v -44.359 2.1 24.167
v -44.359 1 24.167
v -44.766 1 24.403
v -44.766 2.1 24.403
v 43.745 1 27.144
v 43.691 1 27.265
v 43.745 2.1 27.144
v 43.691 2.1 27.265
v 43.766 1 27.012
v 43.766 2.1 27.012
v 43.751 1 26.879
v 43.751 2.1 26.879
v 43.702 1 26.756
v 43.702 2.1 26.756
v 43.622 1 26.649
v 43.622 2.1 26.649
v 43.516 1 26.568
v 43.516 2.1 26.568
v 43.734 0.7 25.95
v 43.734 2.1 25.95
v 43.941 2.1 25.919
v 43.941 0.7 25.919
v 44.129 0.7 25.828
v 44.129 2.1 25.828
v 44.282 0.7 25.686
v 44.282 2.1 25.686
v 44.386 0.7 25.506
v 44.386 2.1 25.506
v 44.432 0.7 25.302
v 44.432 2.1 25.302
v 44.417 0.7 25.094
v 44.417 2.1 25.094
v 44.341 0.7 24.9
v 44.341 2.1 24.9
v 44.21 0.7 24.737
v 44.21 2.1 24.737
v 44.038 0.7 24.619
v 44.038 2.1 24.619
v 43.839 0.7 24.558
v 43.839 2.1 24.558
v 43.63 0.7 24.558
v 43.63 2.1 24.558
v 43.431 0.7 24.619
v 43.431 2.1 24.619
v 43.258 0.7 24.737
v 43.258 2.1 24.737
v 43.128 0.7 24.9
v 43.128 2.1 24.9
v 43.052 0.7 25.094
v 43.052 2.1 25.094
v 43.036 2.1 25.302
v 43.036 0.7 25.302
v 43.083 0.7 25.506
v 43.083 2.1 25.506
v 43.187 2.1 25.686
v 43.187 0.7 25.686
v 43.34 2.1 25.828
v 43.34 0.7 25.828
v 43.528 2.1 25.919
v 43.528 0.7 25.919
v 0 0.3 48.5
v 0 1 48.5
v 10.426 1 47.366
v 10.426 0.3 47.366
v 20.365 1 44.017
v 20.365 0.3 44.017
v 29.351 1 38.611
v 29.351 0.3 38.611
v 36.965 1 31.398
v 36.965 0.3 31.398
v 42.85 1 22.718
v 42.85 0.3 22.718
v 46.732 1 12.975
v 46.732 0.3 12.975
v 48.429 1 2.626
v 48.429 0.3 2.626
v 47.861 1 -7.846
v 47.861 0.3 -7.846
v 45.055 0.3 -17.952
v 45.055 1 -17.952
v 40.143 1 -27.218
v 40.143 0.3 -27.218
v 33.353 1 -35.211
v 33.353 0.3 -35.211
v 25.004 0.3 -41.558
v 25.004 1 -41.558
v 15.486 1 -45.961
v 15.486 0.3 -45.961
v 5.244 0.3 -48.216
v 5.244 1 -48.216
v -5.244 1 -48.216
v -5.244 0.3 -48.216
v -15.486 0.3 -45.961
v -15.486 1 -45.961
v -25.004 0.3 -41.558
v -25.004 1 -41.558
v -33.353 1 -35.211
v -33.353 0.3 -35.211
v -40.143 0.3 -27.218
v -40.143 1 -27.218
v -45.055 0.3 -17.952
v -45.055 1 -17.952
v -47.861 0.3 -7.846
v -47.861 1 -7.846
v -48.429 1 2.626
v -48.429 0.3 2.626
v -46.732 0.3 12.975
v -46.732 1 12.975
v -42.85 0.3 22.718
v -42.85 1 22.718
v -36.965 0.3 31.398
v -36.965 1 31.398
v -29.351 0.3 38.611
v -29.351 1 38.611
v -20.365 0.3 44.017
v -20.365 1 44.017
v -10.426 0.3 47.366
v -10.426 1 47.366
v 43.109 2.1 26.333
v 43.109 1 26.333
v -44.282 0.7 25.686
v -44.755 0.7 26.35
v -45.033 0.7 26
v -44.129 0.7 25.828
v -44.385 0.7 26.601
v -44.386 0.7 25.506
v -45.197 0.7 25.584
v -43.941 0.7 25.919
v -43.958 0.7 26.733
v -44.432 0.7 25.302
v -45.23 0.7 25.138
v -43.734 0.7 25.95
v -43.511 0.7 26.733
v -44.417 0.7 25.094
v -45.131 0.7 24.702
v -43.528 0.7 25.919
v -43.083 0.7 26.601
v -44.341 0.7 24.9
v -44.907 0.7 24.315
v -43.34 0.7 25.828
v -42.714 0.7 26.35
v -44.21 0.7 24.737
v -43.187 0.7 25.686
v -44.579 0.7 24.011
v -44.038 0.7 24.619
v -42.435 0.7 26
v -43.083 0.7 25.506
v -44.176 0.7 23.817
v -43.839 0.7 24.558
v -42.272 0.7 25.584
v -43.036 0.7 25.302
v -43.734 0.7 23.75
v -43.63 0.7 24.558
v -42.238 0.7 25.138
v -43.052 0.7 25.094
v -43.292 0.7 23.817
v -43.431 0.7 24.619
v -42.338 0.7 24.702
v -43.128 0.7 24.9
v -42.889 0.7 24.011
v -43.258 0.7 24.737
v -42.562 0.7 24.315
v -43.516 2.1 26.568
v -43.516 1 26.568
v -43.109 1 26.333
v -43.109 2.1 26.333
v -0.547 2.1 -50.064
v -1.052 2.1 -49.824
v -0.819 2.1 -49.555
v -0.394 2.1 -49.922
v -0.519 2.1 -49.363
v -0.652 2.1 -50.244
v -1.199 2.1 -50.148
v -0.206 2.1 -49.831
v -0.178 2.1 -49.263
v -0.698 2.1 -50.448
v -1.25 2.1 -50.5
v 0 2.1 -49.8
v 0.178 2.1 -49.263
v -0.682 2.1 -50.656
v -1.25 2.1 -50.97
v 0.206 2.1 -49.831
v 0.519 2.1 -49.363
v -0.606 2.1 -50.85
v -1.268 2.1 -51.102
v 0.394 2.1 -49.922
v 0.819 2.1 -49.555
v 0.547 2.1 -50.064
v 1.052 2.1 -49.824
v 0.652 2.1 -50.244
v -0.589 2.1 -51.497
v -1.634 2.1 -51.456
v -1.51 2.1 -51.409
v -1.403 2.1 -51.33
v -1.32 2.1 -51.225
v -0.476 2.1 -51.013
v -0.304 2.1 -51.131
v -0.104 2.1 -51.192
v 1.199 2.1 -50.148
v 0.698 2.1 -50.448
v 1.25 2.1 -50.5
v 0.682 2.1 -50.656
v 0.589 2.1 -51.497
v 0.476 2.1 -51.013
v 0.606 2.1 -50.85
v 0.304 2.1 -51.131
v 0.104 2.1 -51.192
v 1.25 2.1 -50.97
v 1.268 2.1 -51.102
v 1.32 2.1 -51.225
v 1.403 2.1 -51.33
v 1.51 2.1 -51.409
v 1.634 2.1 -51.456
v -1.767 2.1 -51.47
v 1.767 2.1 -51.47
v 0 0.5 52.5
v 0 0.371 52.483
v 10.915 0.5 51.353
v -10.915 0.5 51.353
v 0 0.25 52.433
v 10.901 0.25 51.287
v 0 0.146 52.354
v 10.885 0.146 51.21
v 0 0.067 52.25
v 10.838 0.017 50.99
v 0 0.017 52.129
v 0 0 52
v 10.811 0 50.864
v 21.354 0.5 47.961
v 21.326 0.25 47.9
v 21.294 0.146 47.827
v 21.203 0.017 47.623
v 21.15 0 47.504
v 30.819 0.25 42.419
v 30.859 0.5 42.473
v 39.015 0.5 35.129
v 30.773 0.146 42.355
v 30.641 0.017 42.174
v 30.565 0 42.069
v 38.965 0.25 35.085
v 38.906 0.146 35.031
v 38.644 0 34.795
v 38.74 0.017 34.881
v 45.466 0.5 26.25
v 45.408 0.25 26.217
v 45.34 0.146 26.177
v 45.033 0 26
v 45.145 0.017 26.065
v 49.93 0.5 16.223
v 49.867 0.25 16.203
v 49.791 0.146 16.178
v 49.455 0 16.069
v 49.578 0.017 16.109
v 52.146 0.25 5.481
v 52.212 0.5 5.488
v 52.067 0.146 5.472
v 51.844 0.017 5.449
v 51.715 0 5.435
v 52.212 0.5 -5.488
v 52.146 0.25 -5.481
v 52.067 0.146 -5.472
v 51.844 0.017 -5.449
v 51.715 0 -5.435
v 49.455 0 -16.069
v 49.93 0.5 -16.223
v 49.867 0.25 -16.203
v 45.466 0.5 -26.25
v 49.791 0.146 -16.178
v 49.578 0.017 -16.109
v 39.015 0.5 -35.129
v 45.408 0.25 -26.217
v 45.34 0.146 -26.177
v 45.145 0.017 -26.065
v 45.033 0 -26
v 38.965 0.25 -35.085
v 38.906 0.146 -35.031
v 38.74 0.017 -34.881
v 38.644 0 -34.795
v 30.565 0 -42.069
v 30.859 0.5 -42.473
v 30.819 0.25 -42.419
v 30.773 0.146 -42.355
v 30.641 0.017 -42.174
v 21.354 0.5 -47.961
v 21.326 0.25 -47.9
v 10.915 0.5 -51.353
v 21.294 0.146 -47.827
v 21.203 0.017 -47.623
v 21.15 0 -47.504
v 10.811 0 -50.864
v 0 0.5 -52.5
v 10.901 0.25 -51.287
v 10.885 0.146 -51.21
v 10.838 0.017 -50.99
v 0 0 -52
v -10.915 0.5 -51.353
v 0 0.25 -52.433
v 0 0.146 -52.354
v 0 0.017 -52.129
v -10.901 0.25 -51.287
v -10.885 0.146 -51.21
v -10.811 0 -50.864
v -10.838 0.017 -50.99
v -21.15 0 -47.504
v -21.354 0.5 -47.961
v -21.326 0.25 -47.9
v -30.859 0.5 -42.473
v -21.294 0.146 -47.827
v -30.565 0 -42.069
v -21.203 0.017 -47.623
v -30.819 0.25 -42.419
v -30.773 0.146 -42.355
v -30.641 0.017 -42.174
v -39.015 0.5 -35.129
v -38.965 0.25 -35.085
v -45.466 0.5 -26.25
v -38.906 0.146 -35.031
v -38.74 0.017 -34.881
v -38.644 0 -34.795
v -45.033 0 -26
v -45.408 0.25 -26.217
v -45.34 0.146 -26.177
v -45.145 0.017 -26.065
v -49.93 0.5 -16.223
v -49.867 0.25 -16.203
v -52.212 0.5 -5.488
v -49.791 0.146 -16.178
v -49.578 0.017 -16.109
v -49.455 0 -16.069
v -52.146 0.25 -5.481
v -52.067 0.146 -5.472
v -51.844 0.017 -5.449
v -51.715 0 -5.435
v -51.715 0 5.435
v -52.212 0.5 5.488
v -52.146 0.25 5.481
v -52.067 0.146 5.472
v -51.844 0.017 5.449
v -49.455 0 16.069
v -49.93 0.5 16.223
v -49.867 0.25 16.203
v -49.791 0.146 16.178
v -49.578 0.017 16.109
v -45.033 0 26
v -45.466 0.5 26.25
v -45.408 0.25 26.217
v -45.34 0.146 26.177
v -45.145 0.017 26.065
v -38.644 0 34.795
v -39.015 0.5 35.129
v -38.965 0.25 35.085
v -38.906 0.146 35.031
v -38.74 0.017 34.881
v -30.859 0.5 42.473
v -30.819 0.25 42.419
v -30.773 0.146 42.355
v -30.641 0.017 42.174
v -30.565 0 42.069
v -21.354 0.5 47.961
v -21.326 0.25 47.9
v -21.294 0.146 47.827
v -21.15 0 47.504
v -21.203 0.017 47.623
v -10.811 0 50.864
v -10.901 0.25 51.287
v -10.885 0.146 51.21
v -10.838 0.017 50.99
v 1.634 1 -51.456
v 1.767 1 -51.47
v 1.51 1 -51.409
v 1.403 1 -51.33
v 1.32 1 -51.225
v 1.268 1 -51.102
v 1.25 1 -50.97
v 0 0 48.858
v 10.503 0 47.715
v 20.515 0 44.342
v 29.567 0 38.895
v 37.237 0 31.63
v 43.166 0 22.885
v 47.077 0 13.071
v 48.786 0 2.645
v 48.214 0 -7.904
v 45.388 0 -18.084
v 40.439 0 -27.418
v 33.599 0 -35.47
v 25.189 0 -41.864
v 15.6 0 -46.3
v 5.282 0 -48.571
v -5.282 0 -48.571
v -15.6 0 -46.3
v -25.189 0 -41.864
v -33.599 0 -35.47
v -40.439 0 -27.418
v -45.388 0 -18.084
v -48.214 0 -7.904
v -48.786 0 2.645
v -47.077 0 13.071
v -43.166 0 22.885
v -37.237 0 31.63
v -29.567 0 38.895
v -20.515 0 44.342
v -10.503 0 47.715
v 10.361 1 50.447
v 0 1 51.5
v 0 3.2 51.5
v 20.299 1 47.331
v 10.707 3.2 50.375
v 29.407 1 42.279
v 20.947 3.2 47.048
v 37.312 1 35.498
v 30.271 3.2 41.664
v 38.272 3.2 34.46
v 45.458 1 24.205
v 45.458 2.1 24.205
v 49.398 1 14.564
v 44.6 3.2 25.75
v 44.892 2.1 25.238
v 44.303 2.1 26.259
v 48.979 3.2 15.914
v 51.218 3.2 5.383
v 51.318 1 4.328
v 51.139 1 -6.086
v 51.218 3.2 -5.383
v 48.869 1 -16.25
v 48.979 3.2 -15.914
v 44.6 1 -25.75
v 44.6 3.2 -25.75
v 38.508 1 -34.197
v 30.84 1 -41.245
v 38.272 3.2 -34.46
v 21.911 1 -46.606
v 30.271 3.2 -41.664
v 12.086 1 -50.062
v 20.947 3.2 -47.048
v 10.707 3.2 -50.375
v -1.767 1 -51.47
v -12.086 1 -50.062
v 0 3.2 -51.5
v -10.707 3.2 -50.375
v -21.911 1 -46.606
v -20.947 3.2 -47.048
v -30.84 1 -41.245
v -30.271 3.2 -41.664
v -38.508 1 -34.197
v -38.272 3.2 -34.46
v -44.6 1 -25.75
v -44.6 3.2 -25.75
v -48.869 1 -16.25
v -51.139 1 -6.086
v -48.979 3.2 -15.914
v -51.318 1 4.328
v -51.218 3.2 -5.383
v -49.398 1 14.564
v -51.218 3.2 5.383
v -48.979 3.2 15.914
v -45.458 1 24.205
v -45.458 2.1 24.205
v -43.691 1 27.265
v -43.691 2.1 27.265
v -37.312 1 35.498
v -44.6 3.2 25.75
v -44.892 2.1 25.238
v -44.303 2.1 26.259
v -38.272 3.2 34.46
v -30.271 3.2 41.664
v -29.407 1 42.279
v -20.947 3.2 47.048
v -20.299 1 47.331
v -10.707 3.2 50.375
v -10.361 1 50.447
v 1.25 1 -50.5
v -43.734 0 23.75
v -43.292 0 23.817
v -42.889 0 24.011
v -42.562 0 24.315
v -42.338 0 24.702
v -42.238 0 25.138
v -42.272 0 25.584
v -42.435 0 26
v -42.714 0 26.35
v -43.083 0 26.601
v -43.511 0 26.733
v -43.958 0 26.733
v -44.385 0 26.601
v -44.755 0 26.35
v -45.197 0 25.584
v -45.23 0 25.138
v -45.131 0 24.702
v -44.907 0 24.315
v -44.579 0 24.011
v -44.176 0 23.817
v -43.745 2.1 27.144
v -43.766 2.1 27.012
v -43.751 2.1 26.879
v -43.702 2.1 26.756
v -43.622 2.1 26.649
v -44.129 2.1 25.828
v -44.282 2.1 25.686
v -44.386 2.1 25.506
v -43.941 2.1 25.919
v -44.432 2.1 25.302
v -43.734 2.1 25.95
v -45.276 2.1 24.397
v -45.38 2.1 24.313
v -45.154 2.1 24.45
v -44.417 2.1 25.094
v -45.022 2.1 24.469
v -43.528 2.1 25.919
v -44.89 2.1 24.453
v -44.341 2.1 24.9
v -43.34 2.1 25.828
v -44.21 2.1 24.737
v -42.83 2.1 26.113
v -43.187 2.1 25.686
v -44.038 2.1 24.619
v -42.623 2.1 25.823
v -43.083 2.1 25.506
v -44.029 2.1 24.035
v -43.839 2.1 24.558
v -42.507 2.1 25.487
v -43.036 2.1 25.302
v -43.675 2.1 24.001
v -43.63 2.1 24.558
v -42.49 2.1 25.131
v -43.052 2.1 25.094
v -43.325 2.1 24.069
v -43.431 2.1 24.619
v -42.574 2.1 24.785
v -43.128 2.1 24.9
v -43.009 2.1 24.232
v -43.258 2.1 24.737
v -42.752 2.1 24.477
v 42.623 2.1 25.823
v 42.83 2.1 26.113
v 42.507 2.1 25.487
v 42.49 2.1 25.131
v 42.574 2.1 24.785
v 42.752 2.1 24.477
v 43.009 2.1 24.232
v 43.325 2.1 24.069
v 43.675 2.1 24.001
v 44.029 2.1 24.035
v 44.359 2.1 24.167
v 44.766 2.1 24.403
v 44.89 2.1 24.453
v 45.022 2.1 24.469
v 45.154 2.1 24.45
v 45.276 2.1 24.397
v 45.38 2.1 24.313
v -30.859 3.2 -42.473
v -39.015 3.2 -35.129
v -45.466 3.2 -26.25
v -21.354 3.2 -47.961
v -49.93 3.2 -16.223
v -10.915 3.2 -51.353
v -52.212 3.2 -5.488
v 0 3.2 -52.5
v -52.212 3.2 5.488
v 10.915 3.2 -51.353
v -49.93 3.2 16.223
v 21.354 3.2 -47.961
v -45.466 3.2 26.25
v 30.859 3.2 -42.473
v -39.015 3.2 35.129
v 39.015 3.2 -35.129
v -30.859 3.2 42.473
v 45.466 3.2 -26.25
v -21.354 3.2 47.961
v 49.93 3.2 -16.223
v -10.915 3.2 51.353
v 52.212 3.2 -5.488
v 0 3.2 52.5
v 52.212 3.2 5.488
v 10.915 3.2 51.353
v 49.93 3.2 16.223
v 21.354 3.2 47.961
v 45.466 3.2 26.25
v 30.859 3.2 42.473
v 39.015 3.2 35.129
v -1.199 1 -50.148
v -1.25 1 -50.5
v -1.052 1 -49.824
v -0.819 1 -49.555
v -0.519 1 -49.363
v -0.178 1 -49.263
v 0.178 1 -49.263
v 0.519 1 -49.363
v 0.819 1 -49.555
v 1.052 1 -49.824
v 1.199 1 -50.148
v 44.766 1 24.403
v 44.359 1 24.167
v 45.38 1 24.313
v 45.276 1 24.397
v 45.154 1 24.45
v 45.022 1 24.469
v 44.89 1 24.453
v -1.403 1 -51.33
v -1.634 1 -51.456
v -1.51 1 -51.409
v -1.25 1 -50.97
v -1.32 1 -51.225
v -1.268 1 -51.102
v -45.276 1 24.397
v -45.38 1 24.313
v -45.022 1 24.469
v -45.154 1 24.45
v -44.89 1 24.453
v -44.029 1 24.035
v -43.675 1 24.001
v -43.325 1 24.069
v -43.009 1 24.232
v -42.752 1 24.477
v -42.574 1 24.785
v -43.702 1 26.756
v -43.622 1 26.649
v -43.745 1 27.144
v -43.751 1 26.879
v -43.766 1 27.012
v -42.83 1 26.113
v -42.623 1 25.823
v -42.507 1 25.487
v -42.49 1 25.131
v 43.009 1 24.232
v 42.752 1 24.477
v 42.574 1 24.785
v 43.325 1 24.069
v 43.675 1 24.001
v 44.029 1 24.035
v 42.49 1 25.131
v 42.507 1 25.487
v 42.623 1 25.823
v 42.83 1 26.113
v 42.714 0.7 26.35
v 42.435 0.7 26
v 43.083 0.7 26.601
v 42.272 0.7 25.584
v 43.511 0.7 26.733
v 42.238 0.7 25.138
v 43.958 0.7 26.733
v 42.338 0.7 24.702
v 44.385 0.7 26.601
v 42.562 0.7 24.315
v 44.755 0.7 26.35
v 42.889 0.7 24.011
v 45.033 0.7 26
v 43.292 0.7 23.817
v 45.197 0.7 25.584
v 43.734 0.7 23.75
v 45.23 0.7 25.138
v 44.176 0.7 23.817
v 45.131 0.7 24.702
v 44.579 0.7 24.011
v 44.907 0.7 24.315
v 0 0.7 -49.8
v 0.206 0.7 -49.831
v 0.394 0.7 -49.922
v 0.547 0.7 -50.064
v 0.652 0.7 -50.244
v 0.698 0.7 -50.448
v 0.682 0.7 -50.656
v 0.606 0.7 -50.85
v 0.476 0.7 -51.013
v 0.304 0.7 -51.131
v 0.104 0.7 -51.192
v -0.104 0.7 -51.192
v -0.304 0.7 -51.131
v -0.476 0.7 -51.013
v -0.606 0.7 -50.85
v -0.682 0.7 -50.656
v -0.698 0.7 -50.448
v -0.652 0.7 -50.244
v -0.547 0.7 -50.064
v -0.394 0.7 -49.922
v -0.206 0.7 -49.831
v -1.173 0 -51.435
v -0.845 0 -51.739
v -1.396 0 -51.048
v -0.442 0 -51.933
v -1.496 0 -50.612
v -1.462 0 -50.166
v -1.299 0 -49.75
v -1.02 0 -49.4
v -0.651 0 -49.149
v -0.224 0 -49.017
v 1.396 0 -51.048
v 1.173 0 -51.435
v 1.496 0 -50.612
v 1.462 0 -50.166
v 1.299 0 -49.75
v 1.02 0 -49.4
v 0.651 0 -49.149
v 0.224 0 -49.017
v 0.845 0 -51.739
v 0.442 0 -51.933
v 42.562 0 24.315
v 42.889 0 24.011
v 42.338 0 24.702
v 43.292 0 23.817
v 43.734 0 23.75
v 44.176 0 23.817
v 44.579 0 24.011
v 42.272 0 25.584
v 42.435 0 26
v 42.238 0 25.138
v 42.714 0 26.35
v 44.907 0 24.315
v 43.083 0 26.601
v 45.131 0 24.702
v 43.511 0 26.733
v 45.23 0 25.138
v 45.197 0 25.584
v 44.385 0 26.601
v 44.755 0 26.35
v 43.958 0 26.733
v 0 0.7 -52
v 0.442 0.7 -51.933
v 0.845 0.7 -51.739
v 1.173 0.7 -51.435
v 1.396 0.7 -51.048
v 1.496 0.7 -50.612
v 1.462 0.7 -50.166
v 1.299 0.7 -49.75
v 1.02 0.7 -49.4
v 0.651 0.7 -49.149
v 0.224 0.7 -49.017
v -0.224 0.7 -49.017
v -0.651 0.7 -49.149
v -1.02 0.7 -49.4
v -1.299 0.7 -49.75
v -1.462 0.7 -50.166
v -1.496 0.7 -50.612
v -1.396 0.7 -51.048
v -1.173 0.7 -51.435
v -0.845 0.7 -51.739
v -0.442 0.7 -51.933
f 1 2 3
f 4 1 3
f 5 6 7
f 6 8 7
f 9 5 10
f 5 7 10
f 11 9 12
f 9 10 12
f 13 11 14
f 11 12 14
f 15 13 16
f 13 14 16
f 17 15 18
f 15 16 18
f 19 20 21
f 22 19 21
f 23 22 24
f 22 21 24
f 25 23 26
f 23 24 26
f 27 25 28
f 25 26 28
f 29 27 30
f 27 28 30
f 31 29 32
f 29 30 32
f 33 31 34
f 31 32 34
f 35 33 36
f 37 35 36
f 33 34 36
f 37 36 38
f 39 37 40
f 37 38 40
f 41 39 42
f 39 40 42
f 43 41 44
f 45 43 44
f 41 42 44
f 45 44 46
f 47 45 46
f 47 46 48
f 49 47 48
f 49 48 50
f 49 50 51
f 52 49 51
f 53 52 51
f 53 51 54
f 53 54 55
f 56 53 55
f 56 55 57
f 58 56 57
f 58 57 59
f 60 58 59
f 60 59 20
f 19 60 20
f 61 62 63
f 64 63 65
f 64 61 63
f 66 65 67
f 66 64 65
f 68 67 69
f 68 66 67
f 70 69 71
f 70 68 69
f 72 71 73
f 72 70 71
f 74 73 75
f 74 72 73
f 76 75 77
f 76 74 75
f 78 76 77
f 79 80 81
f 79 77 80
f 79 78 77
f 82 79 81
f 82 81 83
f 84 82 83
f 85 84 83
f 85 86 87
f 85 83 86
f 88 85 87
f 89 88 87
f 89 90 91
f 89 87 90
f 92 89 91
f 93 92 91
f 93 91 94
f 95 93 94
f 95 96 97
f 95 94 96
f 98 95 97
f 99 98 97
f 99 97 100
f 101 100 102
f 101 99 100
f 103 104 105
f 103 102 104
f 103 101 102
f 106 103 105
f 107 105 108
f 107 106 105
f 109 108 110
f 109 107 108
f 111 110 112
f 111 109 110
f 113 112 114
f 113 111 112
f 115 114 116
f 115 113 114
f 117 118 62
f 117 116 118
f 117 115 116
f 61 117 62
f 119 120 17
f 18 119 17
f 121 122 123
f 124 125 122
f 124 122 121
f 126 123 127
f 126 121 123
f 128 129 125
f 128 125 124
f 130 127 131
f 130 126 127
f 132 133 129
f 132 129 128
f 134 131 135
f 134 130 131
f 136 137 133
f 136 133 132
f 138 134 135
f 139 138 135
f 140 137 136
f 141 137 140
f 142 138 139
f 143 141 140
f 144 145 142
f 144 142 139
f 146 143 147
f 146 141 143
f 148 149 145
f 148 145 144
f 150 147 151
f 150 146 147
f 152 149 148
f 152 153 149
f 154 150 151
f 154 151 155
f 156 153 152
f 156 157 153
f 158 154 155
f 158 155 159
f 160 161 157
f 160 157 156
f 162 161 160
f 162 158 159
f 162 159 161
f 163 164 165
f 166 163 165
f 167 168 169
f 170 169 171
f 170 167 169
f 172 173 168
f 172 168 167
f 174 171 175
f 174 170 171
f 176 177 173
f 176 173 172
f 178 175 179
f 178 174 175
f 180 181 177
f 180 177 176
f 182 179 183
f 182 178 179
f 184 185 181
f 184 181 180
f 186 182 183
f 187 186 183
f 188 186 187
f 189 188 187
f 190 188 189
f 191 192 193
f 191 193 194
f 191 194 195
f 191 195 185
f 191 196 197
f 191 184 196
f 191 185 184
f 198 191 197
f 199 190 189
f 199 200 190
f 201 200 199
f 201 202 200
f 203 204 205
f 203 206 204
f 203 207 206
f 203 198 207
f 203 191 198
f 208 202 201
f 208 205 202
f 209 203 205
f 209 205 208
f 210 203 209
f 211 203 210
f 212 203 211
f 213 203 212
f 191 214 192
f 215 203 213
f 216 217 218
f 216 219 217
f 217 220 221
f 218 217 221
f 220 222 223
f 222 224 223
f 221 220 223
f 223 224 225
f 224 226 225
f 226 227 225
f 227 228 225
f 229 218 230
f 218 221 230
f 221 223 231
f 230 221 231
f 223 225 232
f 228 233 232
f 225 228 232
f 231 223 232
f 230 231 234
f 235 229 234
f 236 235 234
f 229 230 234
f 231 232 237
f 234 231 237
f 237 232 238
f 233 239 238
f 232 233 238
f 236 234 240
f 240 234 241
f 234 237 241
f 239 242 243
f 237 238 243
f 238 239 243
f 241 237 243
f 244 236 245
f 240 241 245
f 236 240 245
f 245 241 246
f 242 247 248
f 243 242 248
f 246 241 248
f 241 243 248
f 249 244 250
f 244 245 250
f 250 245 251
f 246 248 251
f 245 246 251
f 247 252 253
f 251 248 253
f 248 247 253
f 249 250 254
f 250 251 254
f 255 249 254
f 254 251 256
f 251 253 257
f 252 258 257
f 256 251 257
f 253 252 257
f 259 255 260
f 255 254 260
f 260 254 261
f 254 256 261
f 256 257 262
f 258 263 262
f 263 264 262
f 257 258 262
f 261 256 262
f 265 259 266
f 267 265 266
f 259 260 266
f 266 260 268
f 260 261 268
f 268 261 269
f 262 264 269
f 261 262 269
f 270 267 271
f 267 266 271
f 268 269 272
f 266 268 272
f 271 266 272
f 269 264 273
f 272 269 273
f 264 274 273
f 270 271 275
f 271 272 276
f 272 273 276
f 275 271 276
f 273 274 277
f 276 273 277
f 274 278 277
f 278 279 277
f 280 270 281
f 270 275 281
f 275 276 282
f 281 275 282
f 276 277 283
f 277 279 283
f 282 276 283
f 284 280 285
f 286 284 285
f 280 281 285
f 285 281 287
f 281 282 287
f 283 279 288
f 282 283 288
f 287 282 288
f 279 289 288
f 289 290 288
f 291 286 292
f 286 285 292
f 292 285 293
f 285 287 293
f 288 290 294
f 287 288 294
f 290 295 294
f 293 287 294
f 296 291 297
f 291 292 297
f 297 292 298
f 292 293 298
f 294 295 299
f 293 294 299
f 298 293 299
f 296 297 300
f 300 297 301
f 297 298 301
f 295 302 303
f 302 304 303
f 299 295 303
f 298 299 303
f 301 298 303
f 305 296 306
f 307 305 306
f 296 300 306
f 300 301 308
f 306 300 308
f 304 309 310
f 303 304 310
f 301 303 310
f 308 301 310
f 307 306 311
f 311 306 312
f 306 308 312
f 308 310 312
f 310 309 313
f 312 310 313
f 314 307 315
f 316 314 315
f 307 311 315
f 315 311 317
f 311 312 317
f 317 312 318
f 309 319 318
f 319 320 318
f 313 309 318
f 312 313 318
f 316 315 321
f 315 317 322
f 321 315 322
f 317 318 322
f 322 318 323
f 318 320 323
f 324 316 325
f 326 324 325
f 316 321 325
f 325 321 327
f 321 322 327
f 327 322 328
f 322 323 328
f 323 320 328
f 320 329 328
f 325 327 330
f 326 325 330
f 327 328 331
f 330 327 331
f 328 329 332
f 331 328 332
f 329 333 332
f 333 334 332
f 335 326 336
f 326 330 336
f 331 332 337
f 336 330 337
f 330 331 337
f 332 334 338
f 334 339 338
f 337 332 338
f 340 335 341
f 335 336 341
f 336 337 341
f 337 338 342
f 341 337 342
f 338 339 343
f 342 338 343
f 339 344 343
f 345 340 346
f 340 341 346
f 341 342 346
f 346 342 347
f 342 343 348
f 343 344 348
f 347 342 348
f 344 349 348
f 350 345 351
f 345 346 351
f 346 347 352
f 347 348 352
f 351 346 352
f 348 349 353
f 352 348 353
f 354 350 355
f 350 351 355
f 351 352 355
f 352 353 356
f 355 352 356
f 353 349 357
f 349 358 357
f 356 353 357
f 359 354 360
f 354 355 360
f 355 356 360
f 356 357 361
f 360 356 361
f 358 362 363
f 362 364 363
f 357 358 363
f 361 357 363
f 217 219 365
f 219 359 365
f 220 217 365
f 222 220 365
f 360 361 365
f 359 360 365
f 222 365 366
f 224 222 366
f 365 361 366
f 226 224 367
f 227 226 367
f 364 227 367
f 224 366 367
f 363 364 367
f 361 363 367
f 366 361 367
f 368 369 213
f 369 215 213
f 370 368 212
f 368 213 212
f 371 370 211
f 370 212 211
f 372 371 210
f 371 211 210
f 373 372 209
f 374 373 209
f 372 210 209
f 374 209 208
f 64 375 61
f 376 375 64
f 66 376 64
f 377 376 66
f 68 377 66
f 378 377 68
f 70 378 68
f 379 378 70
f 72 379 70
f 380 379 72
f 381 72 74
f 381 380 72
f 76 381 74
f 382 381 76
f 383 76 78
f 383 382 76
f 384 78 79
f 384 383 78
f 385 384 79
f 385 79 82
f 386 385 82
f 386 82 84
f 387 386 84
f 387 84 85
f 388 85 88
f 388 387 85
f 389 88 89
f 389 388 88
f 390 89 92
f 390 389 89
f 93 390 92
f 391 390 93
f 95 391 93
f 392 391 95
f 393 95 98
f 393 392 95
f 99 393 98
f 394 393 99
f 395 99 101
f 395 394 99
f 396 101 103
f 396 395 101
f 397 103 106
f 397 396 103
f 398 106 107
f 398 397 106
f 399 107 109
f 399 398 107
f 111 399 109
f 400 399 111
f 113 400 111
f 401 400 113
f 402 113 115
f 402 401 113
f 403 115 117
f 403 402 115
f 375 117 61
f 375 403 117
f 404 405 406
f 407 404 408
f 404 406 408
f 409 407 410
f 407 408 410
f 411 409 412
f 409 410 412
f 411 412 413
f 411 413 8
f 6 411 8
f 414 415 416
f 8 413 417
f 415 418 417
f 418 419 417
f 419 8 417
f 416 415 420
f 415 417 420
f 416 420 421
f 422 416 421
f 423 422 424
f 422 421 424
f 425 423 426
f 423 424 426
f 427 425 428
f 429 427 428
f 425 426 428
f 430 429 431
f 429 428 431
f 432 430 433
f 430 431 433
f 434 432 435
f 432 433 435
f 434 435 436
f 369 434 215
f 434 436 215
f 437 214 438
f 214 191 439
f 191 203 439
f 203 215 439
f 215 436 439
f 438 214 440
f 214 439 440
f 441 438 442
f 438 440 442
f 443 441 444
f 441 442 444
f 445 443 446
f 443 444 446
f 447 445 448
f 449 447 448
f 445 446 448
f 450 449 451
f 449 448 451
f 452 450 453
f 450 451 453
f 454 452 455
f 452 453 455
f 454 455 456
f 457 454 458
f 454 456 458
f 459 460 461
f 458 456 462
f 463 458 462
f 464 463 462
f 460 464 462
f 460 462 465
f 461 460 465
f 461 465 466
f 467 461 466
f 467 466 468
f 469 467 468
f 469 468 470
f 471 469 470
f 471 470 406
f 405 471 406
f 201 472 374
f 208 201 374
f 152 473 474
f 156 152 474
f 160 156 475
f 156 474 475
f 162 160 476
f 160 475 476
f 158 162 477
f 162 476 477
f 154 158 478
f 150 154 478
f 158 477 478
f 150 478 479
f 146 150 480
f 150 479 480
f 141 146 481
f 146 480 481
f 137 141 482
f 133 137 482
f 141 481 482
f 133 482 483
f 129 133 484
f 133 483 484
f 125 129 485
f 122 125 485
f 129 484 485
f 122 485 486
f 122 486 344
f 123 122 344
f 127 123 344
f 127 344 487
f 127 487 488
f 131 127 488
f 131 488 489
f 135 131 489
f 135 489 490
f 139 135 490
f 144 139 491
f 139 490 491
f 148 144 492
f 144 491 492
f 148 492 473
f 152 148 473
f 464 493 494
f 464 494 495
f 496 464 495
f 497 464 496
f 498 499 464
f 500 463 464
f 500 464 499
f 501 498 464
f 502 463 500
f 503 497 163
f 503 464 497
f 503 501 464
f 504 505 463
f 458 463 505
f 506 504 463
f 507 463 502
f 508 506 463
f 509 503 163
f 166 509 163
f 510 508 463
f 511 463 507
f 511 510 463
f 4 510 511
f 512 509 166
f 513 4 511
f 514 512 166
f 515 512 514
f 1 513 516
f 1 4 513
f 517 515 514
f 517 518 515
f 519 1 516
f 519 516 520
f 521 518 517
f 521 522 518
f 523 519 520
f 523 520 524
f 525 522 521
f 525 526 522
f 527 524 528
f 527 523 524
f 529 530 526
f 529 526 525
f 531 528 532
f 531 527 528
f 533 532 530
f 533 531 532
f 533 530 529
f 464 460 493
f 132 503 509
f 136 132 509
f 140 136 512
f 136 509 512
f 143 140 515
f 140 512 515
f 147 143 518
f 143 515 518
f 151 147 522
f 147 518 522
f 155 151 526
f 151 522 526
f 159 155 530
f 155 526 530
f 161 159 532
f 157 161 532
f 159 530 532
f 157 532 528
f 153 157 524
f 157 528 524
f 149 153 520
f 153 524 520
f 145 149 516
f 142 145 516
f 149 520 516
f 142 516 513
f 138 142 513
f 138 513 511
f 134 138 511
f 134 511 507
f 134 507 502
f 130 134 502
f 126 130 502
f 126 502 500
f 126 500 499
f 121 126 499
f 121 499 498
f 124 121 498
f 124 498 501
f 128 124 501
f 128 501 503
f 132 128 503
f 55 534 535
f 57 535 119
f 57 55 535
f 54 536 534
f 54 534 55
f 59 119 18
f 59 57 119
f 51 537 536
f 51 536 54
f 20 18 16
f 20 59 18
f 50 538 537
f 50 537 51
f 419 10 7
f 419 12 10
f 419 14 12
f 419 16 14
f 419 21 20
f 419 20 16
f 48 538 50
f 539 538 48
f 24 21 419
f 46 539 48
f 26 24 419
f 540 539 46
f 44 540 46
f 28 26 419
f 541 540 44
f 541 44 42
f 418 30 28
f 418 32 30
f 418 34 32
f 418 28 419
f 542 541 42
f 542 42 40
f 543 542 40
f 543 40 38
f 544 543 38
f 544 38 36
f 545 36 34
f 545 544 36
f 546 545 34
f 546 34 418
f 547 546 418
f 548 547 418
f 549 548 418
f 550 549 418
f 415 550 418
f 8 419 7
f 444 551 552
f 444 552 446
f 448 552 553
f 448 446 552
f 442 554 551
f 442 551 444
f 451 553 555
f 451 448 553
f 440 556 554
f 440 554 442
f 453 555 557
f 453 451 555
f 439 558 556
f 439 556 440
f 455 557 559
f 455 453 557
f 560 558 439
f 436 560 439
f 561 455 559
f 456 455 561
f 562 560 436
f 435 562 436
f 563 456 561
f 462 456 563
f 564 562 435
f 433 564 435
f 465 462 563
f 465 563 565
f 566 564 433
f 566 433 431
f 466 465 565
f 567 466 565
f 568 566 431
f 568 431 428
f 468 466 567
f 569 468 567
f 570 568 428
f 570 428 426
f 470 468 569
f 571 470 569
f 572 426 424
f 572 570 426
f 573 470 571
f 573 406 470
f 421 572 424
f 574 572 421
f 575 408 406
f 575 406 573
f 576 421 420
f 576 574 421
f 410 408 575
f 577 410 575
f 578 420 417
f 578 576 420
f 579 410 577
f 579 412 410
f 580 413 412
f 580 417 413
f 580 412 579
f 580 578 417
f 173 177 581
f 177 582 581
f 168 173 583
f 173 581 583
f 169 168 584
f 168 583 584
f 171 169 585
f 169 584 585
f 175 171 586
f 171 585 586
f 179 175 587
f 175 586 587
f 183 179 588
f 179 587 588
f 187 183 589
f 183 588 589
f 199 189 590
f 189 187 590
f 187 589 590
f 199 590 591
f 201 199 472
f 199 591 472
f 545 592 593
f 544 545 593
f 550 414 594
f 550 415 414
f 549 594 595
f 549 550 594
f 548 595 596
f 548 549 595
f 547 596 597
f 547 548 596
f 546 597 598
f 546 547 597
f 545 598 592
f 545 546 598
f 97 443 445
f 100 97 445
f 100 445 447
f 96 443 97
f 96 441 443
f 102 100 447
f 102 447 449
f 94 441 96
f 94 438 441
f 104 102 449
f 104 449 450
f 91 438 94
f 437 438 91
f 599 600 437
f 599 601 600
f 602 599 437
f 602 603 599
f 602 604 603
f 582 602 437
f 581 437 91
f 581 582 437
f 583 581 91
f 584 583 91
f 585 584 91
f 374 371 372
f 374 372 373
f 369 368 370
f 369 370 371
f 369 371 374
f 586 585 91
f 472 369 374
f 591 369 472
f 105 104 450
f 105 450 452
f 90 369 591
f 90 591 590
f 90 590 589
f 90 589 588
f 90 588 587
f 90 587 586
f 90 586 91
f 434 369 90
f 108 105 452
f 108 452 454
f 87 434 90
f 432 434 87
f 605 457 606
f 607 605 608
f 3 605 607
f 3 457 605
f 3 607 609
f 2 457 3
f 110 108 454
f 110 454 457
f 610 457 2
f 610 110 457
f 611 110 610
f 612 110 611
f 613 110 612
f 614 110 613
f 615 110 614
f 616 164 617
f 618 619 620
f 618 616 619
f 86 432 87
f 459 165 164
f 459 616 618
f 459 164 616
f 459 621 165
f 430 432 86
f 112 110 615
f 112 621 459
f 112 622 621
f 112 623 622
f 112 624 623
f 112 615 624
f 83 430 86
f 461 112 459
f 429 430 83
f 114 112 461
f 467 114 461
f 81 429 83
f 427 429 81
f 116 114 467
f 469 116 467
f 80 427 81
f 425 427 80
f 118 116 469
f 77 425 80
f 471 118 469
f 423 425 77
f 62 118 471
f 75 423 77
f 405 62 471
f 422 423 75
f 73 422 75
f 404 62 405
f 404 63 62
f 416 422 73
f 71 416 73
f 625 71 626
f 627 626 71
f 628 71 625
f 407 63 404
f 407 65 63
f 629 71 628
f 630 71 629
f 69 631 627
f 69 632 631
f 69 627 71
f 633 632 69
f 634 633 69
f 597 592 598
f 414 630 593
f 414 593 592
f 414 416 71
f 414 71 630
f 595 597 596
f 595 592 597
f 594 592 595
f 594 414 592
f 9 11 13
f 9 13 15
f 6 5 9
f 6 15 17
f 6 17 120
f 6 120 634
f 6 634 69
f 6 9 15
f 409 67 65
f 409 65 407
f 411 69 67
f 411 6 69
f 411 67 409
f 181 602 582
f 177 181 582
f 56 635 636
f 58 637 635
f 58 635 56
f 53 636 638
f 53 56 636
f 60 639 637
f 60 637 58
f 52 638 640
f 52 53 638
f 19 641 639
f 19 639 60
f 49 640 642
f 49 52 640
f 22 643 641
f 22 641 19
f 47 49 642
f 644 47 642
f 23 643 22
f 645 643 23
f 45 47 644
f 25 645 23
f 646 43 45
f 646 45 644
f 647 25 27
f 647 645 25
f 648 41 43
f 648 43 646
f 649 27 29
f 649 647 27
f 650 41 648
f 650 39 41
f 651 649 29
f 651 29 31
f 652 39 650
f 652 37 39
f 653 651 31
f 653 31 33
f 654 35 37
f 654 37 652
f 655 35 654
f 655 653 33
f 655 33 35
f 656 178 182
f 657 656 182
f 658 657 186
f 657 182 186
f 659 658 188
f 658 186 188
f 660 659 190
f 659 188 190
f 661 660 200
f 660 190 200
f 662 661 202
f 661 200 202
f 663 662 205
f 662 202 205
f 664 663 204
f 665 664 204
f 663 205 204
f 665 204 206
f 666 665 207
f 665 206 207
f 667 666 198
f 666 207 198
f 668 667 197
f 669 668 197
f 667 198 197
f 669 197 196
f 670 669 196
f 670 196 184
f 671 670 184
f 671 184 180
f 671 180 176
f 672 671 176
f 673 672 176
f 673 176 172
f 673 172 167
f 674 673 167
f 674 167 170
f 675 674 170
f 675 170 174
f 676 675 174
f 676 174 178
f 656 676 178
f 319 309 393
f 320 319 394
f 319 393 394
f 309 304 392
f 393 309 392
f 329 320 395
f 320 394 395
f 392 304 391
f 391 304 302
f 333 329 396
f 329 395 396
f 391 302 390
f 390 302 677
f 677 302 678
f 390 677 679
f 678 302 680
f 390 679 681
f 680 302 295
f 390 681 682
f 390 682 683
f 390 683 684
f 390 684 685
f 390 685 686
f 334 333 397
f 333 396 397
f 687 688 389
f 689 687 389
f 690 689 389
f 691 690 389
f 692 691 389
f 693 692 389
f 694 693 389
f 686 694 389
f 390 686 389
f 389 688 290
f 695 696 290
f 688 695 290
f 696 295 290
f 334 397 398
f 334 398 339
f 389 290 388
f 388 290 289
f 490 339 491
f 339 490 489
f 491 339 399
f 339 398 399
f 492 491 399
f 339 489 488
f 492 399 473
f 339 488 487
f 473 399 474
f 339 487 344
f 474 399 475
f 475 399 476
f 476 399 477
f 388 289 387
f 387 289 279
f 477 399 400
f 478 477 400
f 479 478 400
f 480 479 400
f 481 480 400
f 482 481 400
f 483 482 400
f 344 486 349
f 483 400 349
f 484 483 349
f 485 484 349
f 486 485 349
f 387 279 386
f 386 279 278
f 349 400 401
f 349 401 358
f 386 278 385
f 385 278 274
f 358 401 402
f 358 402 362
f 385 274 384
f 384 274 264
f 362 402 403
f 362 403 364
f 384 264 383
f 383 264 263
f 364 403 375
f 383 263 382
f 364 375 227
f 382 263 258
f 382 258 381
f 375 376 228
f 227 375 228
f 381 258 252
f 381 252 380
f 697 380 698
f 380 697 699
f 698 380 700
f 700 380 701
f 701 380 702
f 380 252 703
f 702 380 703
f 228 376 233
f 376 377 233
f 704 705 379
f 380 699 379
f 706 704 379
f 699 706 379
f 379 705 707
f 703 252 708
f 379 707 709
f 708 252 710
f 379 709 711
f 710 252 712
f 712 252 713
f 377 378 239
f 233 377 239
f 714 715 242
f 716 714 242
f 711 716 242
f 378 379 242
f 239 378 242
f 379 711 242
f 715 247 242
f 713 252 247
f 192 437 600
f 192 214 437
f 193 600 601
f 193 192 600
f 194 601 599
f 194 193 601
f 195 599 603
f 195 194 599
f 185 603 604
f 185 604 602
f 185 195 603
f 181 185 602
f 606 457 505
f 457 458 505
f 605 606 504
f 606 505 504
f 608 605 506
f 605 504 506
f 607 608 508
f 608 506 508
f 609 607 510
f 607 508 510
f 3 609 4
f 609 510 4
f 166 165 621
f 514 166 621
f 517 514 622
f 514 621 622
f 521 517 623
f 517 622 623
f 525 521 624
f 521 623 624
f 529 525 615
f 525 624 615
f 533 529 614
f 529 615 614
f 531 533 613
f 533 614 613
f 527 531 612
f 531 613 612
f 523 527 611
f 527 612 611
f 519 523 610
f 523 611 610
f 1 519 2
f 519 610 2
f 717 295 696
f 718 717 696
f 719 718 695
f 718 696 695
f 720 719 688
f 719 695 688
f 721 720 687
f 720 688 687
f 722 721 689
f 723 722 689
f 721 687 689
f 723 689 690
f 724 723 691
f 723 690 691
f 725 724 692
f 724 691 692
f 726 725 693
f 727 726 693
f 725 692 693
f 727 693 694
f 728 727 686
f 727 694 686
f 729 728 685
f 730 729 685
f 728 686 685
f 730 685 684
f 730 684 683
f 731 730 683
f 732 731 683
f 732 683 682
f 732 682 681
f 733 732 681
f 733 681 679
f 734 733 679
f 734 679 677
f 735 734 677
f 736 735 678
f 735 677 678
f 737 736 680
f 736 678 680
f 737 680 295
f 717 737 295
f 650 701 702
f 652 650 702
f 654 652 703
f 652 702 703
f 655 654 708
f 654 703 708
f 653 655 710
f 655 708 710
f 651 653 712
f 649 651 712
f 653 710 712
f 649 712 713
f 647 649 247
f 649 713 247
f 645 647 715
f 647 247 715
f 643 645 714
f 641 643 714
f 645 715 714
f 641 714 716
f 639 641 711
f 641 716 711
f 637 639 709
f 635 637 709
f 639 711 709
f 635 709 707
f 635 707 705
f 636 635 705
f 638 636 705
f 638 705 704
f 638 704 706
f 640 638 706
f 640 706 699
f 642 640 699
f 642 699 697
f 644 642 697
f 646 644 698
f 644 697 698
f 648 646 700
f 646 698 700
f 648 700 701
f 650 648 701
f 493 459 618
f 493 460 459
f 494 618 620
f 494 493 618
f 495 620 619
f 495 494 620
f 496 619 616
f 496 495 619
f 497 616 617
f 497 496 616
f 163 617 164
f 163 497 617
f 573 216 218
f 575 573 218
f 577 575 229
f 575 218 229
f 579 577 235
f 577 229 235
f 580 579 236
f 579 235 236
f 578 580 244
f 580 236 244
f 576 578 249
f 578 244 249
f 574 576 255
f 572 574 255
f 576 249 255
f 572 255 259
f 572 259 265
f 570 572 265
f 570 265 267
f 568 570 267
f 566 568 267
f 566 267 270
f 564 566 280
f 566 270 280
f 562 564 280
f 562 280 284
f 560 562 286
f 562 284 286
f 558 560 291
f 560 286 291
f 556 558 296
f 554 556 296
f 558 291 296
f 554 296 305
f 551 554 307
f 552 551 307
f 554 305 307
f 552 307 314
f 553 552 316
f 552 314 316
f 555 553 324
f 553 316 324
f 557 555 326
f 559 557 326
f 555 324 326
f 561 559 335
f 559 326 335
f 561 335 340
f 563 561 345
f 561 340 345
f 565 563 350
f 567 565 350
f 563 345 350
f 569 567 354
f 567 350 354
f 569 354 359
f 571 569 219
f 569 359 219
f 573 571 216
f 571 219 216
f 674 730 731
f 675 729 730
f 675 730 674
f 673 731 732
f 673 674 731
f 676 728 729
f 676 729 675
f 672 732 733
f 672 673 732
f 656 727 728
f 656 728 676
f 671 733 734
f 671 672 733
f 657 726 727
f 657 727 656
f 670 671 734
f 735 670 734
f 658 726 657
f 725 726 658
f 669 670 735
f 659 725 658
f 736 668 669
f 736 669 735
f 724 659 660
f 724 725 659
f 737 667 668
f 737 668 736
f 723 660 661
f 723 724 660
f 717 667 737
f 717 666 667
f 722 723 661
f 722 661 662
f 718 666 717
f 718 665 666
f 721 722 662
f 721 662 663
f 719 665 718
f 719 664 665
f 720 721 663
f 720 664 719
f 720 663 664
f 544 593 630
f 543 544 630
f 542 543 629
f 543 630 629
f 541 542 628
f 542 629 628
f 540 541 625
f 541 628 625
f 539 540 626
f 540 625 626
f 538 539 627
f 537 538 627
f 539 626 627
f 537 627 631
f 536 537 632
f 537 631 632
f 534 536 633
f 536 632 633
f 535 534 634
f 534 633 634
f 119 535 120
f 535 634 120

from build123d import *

# Parameters (mm, degrees)
SKETCH_1_R          = 52.5
SKETCH_1_R_2        = 48.5
EXTRUDE_1_DEPTH     = 3.2
SKETCH_2_R          = 51.5
CUT_EXTRUDE_1_DEPTH = 2.2
SKETCH_3_R          = 1.25
EXTRUDE_2_DEPTH     = 1.1
EXTRUDE_3_DEPTH     = 1.1
SKETCH_5_R          = 0.7
CUT_EXTRUDE_2_DEPTH = 75.315139776
SKETCH_6_R          = 1.5
CUT_EXTRUDE_3_DEPTH = 0.7
FILLET_1_R          = 0.5
CHAMFER_1_SIZE      = 0.3
CHAMFER_1_SIZE2     = 0.357526078


with BuildPart() as part:
    # 草图1 → 凸台-拉伸1 (new body)
    with BuildSketch(Plane(origin=(0, 0, 0), x_dir=(1, 0, 0), z_dir=(0, 1, 0))):
        with Locations(Location((0, 0, 0), (0, 0, 270))):
            Circle(SKETCH_1_R)
        with Locations(Location((0, 0, 0), (0, 0, 270))):
            Circle(SKETCH_1_R_2, mode=Mode.SUBTRACT)
    extrude(amount=EXTRUDE_1_DEPTH)

    # 草图2 → 切除-拉伸1 (cut)
    with BuildSketch(Plane(origin=(0, 3.2, 0), x_dir=(1, 0, 0), z_dir=(0, 1, 0))):
        with Locations(Location((0, 0, 0), (0, 0, 270))):
            Circle(SKETCH_2_R)
    extrude(amount=-CUT_EXTRUDE_1_DEPTH, mode=Mode.SUBTRACT)

    # 草图3 → 凸台-拉伸2 (add)
    with BuildSketch(Plane(origin=(0, 1, 0), x_dir=(1, 0, 0), z_dir=(0, 1, 0))):
        with Locations((-43.734282891, -25.25)):
            Circle(SKETCH_3_R)
        with Locations((43.734282891, -25.25)):
            Circle(SKETCH_3_R)
        with Locations((0, 50.5)):
            Circle(SKETCH_3_R)
    extrude(amount=EXTRUDE_2_DEPTH)

    # 草图4 → 凸台-拉伸3 (add)
    with BuildSketch(Plane(origin=(0, 1, 0), x_dir=(1, 0, 0), z_dir=(0, 1, 0))):
        with BuildLine():
            ThreePointArc((-44.974169566, -25.09131467), (-44.774871009, -24.557413277), (-44.359282891, -24.167468245))
            Line((-44.359282891, -24.167468245), (-45.225308295, -24.667468245))
            Line((-45.225308295, -24.667468245), (-44.600307976, -25.750000552))
            ThreePointArc((-44.600307976, -25.750000552), (-44.788449666, -25.4213449), (-44.974169566, -25.09131467))
        make_face()
        with BuildLine():
            Line((-43.975308295, -26.832531755), (-43.109282891, -26.332531755))
            ThreePointArc((-43.109282891, -26.332531755), (-43.654779254, -26.497469106), (-44.216800701, -26.403116023))
            ThreePointArc((-44.216800701, -26.403116023), (-44.409754992, -26.077263307), (-44.600307976, -25.750000552))
            Line((-44.600307976, -25.750000552), (-43.975308295, -26.832531755))
        make_face()
        with BuildLine():
            Line((-1.59e-07, 51.5), (-1.25, 51.5))
            Line((-1.25, 51.5), (-1.25, 50.5))
            ThreePointArc((-1.25, 50.5), (-1.120091755, 51.054882384), (-0.757368864, 51.494430693))
            ThreePointArc((-0.757368864, 51.494430693), (-0.37869475, 51.498607654), (-1.59e-07, 51.5))
        make_face()
        with BuildLine():
            Line((1.25, 51.5), (-1.59e-07, 51.5))
            ThreePointArc((-1.59e-07, 51.5), (0.378694591, 51.498607655), (0.757368864, 51.494430693))
            ThreePointArc((0.757368864, 51.494430693), (1.120091755, 51.054882384), (1.25, 50.5))
            Line((1.25, 50.5), (1.25, 51.5))
        make_face()
        with BuildLine():
            Line((45.225308295, -24.667468245), (44.359282891, -24.167468245))
            ThreePointArc((44.359282891, -24.167468245), (44.774871009, -24.557413277), (44.974169566, -25.09131467))
            ThreePointArc((44.974169566, -25.09131467), (44.788449793, -25.421344676), (44.600308233, -25.750000108))
            Line((44.600308233, -25.750000108), (45.225308295, -24.667468245))
        make_face()
        with BuildLine():
            ThreePointArc((44.216800701, -26.403116023), (43.654779254, -26.497469107), (43.109282891, -26.332531755))
            Line((43.109282891, -26.332531755), (43.975308295, -26.832531755))
            Line((43.975308295, -26.832531755), (44.600308233, -25.750000108))
            ThreePointArc((44.600308233, -25.750000108), (44.409755121, -26.077263086), (44.216800701, -26.403116023))
        make_face()
    extrude(amount=EXTRUDE_3_DEPTH)

    # 草图5 → 切除-拉伸2 (cut, through all)
    with BuildSketch(Plane(origin=(0, 3.2, 0), x_dir=(1, 0, 0), z_dir=(0, 1, 0))):
        with Locations(Location((0, 50.5, 0), (0, 0, 270))):
            Circle(SKETCH_5_R)
        with Locations(Location((-43.734282891, -25.25, 0), (0, 0, 270))):
            Circle(SKETCH_5_R)
        with Locations(Location((43.734282891, -25.25, 0), (0, 0, 270))):
            Circle(SKETCH_5_R)
    extrude(amount=-CUT_EXTRUDE_2_DEPTH, mode=Mode.SUBTRACT)

    # 草图6 → 切除-拉伸3 (cut)
    with BuildSketch(Plane.XZ):
        with Locations(Location((-43.734282891, 25.25, 0), (0, 0, 270))):
            Circle(SKETCH_6_R)
        with Locations(Location((0, -50.5, 0), (0, 0, 270))):
            Circle(SKETCH_6_R)
        with Locations(Location((43.734282891, 25.25, 0), (0, 0, 270))):
            Circle(SKETCH_6_R)
    extrude(amount=-CUT_EXTRUDE_3_DEPTH, mode=Mode.SUBTRACT)

    # 圆角1
    fillet_1_edges = [part.edges().sort_by_distance(p)[0] for p in [
        (0, 0, -52.5),
        (-43.962168838, 1.55, 26.824945686),
        (-45.212168838, 1.55, 24.659882176),
        (-1.25, 1.55, -51.484827862),
        (1.25, 1.55, -51.484827862),
        (45.212168838, 1.55, 24.659882176),
        (43.962168838, 1.55, 26.824945686),
    ]]
    fillet(fillet_1_edges, radius=FILLET_1_R - 0.0001)  # a hair under: the kernel refuses the full size

    # 倒角1
    chamfer_1_edges = [part.edges().sort_by_distance(p)[0] for p in [
        (0, 0, -48.5),
    ]]
    chamfer_1_side = [part.faces().sort_by_distance(p)[0] for p in [
        (0, 0.5, -48.5),
    ]]
    chamfer(chamfer_1_edges, length=CHAMFER_1_SIZE, length2=CHAMFER_1_SIZE2, reference=chamfer_1_side[0])


solid = part.part
